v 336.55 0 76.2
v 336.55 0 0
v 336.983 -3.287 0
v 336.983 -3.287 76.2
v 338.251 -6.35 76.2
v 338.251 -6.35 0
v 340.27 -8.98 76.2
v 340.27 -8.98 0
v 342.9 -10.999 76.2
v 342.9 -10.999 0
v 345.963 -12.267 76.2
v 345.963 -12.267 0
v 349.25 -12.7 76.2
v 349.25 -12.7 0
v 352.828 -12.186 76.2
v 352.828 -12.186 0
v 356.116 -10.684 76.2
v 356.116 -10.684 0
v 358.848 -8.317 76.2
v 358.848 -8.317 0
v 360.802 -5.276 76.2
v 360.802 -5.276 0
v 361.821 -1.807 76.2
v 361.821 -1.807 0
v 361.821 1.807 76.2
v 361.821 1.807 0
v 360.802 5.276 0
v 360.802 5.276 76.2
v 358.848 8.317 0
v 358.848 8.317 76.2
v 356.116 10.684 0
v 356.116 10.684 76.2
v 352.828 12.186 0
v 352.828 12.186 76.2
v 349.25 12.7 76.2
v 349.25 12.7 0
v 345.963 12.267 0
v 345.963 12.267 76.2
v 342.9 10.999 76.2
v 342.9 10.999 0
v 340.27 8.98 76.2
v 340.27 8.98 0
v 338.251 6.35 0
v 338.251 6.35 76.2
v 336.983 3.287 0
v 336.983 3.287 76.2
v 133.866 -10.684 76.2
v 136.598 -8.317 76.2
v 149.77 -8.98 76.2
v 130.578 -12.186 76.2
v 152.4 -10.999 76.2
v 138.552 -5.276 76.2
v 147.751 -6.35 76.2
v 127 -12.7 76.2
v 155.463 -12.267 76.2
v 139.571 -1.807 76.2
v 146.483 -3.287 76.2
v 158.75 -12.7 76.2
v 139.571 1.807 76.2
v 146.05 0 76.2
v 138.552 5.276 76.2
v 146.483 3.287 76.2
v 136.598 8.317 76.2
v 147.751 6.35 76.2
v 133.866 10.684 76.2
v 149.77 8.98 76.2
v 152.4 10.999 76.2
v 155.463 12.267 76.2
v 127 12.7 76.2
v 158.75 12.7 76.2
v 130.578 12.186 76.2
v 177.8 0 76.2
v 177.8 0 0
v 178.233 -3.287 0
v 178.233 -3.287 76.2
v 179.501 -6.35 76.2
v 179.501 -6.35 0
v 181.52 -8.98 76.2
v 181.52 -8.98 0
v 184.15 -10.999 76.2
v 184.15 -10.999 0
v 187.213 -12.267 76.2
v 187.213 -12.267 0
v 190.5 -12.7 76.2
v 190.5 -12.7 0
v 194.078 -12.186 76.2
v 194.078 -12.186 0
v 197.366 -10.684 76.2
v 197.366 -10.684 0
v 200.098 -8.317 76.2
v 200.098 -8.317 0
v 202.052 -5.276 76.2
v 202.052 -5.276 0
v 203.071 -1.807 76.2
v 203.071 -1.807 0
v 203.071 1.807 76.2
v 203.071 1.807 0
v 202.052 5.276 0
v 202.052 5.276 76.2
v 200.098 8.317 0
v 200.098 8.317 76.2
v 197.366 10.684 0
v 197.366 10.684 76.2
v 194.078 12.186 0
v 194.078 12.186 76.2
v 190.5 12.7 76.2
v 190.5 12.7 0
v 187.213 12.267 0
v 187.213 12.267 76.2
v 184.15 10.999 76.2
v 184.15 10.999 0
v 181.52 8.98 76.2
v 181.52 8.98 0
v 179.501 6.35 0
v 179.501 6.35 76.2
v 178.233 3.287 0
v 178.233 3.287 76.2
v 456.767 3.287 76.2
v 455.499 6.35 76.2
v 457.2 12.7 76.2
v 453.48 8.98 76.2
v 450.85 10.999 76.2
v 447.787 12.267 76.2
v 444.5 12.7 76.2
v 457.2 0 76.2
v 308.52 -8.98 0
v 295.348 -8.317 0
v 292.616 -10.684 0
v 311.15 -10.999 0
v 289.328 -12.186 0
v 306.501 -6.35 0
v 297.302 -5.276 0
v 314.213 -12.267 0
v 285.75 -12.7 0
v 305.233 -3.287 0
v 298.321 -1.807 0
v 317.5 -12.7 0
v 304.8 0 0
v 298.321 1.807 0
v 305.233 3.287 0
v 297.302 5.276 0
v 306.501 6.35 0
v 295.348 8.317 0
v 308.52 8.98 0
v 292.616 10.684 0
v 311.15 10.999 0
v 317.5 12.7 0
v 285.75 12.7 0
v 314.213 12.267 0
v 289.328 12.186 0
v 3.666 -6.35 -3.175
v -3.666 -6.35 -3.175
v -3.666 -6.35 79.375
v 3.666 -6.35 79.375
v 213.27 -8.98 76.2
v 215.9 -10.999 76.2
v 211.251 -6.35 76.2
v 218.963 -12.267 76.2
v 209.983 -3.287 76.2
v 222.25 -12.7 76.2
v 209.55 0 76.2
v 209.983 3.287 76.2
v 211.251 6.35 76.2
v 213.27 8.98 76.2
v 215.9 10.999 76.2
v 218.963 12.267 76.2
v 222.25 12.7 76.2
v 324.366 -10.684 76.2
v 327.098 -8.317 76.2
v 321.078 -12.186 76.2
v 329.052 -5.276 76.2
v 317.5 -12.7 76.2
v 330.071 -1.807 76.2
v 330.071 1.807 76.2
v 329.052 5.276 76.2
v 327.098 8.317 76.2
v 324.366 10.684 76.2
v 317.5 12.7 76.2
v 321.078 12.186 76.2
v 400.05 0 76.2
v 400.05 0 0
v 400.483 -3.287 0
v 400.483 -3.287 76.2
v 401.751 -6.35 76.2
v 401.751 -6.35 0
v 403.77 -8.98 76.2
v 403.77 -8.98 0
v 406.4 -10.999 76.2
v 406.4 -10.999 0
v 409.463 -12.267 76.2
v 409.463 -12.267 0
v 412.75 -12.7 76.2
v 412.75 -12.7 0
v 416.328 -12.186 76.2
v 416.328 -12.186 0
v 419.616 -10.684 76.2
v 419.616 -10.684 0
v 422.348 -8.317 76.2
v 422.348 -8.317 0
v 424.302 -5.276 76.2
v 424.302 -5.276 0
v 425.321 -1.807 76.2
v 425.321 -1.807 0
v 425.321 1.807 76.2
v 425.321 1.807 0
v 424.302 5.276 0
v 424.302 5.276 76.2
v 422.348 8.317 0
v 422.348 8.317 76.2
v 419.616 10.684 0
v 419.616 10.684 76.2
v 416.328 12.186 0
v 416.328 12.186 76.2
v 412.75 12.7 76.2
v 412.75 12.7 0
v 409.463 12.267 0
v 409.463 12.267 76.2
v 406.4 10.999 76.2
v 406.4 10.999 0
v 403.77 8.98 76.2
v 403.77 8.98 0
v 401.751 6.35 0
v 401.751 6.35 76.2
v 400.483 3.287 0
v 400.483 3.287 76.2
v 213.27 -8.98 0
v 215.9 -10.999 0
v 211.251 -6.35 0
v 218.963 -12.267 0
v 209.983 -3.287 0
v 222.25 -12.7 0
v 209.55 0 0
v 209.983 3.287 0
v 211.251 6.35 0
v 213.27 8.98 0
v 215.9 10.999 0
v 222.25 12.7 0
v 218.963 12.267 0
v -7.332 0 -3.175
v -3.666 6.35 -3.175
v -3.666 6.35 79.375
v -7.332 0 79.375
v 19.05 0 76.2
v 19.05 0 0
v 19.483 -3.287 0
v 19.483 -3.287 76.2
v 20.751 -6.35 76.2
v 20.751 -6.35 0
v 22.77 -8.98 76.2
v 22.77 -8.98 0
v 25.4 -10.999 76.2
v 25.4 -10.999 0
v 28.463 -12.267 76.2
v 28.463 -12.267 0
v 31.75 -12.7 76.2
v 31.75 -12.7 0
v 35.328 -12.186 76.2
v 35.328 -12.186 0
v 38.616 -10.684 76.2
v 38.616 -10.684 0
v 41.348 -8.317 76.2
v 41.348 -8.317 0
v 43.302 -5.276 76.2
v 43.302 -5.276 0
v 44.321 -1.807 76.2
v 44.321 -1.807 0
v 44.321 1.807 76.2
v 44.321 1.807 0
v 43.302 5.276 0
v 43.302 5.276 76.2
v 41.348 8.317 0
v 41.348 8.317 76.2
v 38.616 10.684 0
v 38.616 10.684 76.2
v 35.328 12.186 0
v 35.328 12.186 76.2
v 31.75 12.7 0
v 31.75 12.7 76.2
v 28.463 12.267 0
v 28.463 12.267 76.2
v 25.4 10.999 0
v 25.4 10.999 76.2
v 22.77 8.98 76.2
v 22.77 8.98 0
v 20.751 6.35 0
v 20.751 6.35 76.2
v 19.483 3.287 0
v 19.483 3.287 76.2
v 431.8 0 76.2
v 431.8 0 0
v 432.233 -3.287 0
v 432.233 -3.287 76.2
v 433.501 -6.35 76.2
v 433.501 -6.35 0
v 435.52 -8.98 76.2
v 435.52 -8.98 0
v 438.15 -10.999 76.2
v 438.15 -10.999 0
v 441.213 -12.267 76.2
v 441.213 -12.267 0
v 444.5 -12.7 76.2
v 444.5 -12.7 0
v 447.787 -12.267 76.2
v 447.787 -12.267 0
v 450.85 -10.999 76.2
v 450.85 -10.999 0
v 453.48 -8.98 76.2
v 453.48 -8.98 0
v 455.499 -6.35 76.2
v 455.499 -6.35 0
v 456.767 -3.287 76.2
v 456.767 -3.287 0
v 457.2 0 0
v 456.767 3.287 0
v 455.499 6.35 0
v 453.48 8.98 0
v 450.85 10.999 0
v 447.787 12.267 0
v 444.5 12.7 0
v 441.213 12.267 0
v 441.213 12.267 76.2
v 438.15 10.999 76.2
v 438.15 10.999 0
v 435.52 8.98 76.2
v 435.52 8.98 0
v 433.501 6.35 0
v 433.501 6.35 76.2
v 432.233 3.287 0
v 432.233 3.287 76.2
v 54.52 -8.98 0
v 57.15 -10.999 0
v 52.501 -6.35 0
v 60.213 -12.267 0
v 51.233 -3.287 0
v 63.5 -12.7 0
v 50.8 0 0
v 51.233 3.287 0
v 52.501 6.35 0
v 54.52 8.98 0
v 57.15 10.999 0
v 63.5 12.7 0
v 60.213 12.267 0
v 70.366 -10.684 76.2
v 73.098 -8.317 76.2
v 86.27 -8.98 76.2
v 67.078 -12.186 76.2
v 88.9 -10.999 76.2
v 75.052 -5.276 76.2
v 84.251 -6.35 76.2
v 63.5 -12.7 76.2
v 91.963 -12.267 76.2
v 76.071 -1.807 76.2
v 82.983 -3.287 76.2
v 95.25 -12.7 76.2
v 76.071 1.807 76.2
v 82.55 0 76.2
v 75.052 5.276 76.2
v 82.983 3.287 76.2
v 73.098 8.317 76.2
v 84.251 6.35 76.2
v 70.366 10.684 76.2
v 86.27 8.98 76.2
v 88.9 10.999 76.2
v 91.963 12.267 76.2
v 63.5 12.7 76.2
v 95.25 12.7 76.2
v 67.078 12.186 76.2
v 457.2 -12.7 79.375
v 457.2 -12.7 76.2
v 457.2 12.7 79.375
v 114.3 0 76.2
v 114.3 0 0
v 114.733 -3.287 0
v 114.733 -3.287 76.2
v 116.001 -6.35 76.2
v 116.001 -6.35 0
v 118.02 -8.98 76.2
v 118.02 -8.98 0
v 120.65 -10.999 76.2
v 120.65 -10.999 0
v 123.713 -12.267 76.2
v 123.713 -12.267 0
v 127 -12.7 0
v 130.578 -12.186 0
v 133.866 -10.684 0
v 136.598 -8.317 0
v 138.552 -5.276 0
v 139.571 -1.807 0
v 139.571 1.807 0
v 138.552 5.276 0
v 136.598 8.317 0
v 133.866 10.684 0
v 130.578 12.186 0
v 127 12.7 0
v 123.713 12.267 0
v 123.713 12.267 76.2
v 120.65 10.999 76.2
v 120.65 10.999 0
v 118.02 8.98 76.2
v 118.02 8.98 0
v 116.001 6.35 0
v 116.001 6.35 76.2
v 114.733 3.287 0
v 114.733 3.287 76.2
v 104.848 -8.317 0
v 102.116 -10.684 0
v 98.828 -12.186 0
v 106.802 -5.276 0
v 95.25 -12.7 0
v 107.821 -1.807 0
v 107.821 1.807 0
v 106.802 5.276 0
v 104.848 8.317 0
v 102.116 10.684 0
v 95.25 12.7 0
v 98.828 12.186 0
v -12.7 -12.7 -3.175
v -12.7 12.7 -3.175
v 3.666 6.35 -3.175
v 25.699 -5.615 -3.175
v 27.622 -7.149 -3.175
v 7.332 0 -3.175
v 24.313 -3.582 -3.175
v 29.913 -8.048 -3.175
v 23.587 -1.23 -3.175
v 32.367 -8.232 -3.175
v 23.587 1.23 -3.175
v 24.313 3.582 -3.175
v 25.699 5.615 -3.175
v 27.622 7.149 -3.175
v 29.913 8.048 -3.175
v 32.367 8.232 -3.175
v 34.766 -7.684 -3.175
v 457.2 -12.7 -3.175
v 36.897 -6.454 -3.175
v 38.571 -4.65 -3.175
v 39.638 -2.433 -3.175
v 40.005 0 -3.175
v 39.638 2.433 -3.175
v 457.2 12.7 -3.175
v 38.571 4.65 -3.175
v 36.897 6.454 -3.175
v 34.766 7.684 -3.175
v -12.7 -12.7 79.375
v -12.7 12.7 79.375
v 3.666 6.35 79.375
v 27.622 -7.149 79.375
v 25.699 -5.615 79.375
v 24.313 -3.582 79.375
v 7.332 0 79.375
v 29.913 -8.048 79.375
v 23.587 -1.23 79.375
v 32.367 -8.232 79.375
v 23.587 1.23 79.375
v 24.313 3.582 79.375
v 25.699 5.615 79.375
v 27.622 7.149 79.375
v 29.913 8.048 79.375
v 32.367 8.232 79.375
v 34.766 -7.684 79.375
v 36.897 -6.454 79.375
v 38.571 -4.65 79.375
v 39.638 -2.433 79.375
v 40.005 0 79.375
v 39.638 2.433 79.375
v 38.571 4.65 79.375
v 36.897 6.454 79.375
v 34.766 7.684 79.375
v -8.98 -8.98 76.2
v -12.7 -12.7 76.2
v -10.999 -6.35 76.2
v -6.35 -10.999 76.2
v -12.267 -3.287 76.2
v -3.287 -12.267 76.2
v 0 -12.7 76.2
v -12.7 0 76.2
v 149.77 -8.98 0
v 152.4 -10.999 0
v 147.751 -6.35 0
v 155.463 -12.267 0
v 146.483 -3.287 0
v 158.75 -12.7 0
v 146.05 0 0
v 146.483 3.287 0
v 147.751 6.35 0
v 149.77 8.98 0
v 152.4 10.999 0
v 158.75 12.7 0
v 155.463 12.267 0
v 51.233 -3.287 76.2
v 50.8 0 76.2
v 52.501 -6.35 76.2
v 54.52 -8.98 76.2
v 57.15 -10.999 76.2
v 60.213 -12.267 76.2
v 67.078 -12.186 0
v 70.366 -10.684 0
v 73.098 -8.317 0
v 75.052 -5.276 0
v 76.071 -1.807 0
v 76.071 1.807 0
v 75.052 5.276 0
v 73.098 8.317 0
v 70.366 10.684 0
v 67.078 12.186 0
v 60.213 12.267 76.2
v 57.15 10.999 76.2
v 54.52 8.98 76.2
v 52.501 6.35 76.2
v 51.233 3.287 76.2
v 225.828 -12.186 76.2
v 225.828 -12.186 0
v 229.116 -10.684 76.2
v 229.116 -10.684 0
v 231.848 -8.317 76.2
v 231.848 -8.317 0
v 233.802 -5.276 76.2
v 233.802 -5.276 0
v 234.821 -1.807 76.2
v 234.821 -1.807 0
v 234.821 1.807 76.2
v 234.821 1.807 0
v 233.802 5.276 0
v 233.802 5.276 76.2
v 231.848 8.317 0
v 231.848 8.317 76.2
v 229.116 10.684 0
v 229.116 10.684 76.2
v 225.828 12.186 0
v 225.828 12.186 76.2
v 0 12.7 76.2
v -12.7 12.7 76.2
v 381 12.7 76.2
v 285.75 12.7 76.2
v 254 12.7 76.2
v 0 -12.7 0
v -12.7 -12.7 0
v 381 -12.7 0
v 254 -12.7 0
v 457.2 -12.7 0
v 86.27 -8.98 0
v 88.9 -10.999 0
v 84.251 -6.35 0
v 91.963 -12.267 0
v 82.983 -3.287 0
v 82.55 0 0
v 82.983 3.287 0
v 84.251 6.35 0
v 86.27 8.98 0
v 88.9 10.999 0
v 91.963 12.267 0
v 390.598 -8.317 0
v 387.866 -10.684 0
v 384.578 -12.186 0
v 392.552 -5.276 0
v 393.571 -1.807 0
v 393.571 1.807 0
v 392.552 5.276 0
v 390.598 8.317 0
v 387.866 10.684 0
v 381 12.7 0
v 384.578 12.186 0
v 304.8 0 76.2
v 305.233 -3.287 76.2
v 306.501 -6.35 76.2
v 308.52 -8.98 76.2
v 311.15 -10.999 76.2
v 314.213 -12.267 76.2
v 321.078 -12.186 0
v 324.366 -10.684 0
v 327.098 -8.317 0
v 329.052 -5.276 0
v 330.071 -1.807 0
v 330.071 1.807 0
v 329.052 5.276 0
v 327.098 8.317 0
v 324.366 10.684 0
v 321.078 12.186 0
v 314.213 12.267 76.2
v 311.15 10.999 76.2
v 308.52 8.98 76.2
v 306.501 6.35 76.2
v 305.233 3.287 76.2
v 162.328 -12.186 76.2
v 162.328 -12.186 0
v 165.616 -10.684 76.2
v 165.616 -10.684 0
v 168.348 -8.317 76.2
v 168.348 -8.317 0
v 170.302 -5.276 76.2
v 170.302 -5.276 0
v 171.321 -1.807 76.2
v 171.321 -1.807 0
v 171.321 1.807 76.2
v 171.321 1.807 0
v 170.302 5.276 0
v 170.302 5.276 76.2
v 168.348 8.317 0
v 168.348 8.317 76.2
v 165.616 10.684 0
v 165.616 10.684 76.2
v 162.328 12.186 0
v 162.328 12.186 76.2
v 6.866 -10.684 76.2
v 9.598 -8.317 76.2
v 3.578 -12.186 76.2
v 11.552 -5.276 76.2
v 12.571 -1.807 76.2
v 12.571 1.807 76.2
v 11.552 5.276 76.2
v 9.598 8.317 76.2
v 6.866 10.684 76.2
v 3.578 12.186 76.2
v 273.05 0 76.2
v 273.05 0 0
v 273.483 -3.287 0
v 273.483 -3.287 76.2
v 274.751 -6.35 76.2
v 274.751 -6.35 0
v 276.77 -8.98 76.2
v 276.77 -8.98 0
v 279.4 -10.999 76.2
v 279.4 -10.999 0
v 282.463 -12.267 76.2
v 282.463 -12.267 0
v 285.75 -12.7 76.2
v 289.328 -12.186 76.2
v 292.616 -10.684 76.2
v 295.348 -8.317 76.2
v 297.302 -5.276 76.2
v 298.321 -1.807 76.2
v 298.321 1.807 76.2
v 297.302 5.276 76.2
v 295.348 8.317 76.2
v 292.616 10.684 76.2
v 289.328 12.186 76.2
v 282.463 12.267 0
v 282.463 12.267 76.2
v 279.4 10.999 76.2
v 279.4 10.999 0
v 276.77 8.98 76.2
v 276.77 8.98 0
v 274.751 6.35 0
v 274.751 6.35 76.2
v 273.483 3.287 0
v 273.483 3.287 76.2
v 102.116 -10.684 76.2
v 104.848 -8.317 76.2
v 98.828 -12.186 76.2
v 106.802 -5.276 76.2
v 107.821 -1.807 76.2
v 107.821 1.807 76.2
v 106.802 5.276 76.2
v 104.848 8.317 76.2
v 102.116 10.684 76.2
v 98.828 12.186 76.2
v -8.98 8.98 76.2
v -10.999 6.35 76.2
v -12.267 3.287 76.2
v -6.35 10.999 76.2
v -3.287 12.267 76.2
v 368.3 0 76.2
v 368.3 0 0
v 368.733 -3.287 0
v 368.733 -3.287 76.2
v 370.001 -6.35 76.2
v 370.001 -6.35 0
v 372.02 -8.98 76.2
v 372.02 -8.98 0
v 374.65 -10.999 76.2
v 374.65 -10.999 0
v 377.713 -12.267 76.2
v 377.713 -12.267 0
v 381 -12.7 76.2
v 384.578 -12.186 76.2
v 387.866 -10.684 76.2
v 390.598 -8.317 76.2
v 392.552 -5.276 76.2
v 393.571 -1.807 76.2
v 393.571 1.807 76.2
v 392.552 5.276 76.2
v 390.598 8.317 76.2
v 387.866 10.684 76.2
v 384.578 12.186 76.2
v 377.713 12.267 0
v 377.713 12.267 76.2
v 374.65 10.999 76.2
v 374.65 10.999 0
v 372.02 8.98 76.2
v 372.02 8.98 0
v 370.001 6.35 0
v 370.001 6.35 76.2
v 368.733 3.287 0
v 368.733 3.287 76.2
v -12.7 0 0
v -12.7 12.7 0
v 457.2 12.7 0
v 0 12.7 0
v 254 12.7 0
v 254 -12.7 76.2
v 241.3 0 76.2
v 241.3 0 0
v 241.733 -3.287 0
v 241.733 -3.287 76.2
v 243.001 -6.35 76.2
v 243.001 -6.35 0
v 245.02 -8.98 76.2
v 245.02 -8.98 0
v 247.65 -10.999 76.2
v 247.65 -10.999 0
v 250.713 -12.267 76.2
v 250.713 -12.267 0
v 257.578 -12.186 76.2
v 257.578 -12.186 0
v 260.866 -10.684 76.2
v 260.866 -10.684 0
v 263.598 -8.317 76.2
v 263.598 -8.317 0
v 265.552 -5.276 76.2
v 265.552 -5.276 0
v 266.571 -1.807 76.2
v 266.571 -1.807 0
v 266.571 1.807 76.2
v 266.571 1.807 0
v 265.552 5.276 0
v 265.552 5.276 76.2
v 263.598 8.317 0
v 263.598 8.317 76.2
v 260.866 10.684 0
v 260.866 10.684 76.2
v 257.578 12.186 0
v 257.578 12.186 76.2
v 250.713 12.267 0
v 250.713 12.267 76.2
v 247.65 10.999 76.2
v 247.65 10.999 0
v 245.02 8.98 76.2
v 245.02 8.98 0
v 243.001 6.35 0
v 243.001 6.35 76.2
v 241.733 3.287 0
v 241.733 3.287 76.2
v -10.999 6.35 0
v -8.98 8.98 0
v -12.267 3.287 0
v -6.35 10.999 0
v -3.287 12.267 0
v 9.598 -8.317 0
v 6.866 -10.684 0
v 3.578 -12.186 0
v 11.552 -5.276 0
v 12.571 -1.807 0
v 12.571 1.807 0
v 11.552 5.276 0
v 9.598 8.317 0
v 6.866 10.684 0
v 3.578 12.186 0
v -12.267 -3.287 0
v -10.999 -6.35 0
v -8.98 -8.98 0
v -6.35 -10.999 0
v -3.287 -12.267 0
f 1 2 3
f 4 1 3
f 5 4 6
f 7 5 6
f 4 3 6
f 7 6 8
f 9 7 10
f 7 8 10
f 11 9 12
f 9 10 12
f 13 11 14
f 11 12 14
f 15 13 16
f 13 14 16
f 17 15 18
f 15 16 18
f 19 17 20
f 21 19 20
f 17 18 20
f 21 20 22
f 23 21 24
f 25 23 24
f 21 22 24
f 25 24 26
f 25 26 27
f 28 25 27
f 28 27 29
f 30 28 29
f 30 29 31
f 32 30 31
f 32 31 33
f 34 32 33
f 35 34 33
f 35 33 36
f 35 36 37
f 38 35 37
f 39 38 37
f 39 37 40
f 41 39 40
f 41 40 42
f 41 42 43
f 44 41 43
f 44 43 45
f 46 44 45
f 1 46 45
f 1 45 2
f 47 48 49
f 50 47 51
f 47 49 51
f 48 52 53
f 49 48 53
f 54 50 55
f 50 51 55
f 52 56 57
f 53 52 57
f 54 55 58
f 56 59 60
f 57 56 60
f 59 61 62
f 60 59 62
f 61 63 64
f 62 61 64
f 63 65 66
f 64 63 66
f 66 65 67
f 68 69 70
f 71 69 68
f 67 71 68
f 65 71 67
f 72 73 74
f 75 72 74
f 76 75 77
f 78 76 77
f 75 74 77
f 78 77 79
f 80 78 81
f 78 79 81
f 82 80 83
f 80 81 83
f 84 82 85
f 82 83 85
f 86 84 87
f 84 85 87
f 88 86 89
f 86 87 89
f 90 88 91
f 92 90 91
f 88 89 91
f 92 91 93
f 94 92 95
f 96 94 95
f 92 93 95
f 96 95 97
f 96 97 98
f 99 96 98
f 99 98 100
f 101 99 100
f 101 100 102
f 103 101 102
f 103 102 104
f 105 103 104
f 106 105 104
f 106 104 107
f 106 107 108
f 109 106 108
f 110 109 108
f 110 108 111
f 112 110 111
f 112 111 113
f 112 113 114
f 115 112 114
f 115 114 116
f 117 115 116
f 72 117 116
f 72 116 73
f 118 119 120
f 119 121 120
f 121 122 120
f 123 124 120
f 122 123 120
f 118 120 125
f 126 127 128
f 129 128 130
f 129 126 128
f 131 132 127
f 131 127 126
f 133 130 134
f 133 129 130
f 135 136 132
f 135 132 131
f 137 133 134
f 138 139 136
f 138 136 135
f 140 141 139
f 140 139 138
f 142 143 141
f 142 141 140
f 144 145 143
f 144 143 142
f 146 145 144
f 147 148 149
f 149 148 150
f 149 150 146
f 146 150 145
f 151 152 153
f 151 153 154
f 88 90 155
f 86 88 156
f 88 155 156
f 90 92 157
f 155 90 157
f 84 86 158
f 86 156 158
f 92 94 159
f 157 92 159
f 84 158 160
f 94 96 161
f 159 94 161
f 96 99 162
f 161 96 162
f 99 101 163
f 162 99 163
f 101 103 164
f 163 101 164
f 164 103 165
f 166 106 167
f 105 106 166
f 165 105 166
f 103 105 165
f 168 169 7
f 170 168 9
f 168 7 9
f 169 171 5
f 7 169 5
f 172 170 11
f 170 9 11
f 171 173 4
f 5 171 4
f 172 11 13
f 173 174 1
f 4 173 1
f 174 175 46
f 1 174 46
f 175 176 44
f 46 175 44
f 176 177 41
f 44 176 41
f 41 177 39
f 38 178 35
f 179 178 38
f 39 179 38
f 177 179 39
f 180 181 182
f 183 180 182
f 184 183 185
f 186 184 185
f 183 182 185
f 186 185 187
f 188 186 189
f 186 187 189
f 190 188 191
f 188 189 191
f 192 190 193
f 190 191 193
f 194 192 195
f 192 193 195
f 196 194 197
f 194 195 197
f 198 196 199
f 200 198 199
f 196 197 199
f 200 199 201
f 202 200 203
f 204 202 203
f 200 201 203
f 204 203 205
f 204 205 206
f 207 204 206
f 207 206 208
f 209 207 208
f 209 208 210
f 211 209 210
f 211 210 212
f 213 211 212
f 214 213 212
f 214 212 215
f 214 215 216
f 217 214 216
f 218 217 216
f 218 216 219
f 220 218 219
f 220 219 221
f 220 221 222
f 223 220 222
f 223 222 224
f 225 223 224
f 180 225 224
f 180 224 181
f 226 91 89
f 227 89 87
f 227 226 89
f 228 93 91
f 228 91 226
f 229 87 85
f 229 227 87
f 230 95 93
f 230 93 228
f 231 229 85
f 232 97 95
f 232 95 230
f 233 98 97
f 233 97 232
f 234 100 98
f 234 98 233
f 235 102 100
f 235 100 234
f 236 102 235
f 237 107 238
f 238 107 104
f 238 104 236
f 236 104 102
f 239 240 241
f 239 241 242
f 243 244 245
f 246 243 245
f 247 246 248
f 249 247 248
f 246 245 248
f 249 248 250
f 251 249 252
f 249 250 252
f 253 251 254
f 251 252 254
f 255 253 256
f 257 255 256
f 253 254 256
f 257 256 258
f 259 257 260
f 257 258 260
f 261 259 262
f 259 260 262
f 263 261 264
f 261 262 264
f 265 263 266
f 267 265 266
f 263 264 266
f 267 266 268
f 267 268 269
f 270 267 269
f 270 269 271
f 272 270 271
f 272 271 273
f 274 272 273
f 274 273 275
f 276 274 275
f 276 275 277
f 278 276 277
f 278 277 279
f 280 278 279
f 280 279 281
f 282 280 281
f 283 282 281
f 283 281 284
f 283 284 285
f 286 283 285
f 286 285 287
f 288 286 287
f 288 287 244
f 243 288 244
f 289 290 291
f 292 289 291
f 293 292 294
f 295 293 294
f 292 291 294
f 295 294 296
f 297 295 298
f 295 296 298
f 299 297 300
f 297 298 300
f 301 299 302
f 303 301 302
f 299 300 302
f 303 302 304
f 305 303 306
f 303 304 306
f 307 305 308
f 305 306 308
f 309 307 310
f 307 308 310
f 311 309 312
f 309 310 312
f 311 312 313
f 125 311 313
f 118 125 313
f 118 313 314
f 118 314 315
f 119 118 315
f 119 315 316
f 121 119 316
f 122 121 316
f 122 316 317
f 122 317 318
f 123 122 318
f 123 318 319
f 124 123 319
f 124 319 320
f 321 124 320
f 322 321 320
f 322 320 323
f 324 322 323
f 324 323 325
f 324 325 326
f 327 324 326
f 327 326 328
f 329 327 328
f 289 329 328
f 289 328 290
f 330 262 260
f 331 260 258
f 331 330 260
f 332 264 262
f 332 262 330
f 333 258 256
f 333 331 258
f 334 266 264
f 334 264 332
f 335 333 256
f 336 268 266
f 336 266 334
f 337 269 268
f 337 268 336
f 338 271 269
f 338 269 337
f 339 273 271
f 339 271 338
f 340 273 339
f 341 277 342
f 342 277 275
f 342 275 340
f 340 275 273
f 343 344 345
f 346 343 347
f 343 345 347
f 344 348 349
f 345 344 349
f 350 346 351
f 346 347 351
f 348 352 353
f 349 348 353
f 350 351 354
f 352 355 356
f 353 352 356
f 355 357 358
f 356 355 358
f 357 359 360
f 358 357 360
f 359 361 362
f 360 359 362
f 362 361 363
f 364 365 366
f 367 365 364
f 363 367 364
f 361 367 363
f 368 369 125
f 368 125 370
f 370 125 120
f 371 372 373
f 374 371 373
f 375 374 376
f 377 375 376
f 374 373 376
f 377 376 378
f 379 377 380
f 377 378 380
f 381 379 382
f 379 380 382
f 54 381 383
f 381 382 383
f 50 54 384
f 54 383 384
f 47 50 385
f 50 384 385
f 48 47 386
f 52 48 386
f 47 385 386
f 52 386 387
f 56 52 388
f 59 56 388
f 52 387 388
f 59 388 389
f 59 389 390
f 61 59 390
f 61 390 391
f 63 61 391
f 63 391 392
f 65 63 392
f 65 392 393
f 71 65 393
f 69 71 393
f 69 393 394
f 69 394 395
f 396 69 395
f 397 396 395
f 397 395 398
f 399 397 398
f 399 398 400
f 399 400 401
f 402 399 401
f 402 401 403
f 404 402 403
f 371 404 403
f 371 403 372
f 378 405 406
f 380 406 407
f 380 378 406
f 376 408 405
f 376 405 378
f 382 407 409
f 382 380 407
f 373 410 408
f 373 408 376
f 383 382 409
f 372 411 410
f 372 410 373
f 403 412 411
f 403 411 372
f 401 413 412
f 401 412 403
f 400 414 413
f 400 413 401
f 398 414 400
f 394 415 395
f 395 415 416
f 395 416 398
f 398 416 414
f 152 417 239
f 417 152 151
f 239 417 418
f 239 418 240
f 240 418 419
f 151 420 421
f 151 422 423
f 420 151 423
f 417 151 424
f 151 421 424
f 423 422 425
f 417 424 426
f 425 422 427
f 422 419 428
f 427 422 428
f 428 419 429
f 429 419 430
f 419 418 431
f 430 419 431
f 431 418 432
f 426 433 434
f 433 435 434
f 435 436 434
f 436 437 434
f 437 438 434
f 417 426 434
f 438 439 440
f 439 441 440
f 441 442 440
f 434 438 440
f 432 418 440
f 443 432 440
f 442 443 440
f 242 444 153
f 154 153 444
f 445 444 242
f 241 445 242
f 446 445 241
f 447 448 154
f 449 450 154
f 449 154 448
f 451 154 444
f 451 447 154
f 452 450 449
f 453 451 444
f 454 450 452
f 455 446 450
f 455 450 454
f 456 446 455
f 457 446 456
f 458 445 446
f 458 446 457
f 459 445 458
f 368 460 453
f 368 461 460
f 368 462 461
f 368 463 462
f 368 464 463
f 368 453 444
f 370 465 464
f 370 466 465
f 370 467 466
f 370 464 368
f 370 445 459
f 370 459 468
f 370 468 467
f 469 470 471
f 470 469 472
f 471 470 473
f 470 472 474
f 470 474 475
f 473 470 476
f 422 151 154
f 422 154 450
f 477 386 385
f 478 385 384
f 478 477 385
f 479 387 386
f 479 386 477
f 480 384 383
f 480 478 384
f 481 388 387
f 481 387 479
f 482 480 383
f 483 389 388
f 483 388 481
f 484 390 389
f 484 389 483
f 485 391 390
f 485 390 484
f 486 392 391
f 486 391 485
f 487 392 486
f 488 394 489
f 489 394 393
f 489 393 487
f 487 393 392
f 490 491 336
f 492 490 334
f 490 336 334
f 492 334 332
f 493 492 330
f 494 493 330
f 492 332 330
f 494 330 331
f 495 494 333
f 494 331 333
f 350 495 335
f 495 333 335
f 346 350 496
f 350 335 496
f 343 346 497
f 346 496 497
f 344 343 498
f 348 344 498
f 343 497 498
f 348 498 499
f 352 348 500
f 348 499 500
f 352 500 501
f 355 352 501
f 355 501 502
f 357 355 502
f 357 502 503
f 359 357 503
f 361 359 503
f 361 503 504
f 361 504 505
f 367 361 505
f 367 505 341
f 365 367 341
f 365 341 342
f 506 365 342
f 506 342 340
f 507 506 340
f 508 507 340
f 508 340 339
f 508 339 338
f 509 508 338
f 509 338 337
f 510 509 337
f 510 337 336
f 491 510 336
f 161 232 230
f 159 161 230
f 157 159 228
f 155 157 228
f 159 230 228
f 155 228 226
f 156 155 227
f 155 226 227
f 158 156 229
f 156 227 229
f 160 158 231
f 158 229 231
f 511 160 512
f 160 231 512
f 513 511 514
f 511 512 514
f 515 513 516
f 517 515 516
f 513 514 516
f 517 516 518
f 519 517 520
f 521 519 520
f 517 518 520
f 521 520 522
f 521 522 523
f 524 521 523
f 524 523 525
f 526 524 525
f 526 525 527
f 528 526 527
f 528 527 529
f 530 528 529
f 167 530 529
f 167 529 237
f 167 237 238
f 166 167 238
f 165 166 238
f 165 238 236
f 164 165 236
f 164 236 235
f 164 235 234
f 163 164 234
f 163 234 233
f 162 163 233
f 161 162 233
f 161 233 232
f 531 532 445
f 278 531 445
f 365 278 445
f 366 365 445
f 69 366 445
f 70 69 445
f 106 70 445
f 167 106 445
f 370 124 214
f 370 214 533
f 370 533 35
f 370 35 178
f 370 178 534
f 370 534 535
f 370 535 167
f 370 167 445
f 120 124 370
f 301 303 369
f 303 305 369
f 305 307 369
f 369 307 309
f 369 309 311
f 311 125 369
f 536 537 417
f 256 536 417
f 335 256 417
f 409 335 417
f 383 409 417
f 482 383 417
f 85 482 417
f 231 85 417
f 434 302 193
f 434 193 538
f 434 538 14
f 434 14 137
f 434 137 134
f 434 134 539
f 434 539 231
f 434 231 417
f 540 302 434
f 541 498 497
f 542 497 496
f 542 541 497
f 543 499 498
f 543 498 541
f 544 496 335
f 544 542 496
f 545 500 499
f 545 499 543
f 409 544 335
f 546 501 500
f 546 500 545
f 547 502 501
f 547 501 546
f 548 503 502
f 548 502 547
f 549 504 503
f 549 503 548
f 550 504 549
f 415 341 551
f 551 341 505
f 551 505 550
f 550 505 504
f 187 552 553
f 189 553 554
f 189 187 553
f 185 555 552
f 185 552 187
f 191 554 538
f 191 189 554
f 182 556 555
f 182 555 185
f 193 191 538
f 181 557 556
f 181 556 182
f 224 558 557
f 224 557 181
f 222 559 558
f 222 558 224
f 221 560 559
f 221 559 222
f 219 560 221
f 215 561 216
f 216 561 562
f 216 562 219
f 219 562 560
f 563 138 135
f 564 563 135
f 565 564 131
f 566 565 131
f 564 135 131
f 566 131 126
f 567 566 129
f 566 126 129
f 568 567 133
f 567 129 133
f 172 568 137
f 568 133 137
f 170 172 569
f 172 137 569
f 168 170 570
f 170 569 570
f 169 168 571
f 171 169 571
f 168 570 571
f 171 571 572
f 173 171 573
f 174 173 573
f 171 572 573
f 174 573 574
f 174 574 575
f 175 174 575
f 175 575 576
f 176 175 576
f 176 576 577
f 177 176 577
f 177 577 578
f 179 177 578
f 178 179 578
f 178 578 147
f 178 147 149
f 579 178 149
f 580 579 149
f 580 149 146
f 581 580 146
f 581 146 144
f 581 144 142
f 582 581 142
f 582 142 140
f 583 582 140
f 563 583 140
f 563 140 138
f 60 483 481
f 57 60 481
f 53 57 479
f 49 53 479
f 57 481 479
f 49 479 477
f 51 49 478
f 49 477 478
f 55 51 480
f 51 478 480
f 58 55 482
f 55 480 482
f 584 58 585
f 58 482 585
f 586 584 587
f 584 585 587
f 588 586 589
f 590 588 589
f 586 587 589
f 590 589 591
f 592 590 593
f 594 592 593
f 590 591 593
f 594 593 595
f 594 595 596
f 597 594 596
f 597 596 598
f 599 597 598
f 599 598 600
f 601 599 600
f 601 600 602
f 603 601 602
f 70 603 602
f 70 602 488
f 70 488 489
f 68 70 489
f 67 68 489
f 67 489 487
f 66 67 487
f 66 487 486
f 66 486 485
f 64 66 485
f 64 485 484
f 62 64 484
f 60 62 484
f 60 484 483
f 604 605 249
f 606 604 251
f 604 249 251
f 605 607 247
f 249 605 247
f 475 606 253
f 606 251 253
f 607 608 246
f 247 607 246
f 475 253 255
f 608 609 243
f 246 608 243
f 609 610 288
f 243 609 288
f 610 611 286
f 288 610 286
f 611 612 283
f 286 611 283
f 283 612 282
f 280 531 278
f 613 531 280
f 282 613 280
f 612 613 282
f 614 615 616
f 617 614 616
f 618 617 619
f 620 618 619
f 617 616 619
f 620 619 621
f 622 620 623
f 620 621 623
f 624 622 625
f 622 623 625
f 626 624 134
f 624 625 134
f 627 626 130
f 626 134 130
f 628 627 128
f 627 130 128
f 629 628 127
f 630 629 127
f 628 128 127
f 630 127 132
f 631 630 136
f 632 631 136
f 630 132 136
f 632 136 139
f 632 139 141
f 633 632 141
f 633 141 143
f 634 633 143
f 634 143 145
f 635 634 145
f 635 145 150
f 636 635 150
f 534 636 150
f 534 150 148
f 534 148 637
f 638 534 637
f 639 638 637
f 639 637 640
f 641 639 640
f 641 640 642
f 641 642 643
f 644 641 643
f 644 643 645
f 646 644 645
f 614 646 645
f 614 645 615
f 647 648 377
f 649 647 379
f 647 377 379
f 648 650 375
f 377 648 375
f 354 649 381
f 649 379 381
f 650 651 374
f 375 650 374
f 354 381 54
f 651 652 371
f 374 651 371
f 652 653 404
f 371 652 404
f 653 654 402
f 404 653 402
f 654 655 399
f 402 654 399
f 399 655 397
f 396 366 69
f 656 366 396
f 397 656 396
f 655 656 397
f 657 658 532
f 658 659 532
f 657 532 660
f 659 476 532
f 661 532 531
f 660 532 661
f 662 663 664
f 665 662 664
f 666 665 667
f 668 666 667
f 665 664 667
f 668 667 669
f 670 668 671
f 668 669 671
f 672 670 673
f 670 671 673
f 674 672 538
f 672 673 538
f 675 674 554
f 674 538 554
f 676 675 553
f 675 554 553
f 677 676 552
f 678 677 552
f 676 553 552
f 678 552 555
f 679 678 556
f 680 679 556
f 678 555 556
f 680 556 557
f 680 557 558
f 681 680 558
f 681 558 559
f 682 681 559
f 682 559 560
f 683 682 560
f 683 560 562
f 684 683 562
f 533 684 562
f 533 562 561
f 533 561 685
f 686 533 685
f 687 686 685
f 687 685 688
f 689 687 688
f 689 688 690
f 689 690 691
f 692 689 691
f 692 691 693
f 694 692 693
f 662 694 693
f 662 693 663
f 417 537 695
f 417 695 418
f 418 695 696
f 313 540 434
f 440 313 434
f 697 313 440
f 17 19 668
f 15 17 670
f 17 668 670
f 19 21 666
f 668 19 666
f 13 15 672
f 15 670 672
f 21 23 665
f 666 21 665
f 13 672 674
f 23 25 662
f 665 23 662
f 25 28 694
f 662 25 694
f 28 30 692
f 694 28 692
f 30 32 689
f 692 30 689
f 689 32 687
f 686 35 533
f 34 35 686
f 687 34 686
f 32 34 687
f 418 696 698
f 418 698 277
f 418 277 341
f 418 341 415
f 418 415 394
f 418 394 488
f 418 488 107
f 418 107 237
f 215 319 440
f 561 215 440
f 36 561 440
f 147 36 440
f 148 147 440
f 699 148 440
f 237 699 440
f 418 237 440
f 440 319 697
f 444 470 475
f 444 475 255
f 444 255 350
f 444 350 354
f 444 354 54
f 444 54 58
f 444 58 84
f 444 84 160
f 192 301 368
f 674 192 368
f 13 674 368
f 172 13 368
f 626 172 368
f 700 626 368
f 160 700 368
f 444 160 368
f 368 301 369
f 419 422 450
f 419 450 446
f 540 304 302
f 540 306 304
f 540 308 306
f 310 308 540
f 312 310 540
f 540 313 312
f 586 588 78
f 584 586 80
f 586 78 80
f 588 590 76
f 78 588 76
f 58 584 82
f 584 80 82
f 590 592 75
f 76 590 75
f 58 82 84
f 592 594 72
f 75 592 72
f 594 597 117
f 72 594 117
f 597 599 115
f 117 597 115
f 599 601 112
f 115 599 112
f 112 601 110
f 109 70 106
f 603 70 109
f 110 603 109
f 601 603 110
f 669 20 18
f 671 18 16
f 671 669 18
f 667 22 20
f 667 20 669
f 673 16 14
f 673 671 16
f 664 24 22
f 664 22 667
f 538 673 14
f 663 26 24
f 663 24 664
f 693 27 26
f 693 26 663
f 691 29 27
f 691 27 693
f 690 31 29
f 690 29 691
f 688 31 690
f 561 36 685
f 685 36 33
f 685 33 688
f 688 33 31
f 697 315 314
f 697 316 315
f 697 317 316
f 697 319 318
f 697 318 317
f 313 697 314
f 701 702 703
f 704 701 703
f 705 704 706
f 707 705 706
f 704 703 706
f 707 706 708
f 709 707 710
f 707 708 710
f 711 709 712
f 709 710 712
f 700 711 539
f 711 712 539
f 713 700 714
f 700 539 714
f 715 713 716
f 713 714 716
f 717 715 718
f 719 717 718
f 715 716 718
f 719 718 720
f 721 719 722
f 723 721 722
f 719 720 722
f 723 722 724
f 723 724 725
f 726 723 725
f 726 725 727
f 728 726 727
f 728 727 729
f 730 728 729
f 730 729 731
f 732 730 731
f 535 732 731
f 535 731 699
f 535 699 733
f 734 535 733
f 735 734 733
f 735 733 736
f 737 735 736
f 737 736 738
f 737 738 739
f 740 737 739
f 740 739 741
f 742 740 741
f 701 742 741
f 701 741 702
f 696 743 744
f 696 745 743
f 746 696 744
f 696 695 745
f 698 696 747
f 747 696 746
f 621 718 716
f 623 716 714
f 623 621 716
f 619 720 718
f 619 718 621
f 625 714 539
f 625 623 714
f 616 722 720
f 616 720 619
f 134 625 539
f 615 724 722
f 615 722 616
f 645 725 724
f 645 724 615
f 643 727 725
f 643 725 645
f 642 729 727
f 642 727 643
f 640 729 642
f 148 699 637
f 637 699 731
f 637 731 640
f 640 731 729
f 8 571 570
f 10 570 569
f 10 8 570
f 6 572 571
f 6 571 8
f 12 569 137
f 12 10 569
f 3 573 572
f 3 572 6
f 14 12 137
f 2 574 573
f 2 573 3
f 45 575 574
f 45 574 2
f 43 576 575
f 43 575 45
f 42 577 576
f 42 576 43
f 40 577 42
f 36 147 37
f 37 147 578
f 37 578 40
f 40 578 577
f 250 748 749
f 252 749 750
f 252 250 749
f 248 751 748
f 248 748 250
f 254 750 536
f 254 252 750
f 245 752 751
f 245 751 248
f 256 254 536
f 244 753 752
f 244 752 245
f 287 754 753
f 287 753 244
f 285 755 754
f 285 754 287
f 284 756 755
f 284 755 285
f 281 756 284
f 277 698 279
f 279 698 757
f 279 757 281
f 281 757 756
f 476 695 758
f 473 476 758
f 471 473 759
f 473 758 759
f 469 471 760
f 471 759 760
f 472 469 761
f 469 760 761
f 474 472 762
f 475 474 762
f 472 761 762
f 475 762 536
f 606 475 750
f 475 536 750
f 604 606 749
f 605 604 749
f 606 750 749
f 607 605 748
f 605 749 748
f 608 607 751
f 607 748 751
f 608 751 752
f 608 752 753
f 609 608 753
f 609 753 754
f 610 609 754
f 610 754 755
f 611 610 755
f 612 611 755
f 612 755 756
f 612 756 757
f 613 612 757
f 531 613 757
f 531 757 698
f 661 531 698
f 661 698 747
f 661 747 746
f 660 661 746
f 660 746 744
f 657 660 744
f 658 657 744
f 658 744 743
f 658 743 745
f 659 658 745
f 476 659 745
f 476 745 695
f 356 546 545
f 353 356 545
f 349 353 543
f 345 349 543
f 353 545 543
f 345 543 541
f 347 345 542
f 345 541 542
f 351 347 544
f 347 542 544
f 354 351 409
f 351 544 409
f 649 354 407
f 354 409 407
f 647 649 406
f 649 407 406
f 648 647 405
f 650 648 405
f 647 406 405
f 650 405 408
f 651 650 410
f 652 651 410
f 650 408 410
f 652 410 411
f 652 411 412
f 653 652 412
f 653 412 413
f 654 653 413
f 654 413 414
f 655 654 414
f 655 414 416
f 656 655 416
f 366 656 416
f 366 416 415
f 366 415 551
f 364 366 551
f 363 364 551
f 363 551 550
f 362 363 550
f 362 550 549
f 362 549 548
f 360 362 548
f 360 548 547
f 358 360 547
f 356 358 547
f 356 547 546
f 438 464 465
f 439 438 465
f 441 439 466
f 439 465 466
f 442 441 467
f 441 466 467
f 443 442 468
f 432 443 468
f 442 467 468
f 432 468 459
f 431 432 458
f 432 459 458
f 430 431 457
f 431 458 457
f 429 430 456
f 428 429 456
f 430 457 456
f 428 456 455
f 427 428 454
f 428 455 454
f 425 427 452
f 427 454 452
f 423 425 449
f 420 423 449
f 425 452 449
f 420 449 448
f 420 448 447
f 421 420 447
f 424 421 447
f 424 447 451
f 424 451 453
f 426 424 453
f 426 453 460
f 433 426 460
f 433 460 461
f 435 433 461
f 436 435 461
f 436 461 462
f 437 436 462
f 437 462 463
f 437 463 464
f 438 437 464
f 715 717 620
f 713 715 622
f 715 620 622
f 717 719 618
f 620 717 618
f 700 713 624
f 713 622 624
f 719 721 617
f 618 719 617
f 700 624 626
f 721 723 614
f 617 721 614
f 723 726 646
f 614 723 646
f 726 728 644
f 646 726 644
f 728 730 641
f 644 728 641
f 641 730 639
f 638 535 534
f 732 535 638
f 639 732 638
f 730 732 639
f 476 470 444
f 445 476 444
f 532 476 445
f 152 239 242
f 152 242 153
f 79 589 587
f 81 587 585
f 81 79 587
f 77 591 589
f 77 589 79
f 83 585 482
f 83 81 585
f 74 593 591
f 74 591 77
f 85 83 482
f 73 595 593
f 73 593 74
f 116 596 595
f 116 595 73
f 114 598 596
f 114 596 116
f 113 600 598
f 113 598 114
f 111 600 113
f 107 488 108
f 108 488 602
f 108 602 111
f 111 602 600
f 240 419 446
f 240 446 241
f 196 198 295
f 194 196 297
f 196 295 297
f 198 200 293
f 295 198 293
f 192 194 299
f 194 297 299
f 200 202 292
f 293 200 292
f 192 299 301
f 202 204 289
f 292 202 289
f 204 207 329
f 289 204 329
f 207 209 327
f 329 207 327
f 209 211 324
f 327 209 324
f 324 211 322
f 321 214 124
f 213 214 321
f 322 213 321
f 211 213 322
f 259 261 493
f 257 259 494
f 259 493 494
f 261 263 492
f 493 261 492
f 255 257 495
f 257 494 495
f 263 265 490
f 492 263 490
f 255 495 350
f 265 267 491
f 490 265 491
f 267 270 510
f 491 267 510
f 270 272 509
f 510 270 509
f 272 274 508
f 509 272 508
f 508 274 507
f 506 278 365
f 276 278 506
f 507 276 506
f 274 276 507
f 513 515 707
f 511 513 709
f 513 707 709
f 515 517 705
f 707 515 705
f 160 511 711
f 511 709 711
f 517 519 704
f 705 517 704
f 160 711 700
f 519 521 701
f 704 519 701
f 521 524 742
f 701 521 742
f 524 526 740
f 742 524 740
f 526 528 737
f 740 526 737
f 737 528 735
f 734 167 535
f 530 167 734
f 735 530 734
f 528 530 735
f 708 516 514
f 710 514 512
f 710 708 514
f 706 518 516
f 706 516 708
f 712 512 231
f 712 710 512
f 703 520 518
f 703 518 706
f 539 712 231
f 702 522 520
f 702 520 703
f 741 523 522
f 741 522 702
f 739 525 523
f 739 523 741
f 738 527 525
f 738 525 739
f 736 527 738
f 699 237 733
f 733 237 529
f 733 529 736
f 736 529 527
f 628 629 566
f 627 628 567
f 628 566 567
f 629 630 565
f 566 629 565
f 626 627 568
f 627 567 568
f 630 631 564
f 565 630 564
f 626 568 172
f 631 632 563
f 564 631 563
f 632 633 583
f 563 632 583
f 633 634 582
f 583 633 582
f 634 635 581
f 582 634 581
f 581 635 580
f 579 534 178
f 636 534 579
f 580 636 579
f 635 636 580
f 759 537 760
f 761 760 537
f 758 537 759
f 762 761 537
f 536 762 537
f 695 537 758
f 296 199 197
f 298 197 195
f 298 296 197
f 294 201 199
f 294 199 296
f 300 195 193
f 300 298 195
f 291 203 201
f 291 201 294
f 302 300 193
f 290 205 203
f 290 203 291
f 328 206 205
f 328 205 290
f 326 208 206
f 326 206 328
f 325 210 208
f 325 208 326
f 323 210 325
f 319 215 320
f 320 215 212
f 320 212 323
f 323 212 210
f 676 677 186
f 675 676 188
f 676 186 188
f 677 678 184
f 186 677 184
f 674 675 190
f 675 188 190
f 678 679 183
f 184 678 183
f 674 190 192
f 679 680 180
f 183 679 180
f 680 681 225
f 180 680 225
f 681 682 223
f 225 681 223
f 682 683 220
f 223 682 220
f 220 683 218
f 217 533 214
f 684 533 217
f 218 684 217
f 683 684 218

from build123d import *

# Parameters (mm, degrees)
SKETCH1_R           = 12.7
BOSS_EXTRUDE1_DEPTH = 76.2
LPATTERN1_COUNT     = 15
LPATTERN1_PITCH     = 31.75
SKETCH2_W           = 469.9
SKETCH2_H           = 25.4
BOSS_EXTRUDE2_DEPTH = 3.175
SKETCH3_R           = 8.255
CUT_EXTRUDE1_DEPTH  = 465.766212735


with BuildPart() as part:
    # Sketch1 → Boss-Extrude1 (new body)
    with BuildSketch(Plane.XY):
        with Locations(Location((0, 0, 0), (0, 0, 180))):
            Circle(SKETCH1_R)
    extrude(amount=BOSS_EXTRUDE1_DEPTH)


with BuildPart() as lpattern1_1:
    # LPattern1: pattern copy
    add(part.part.moved(Location(Vector(1, 0, 0) * (1 * LPATTERN1_PITCH))))


with BuildPart() as lpattern1_2:
    # LPattern1: pattern copy
    add(part.part.moved(Location(Vector(1, 0, 0) * (2 * LPATTERN1_PITCH))))


with BuildPart() as lpattern1_3:
    # LPattern1: pattern copy
    add(part.part.moved(Location(Vector(1, 0, 0) * (3 * LPATTERN1_PITCH))))


with BuildPart() as lpattern1_4:
    # LPattern1: pattern copy
    add(part.part.moved(Location(Vector(1, 0, 0) * (4 * LPATTERN1_PITCH))))


with BuildPart() as lpattern1_5:
    # LPattern1: pattern copy
    add(part.part.moved(Location(Vector(1, 0, 0) * (5 * LPATTERN1_PITCH))))


with BuildPart() as lpattern1_6:
    # LPattern1: pattern copy
    add(part.part.moved(Location(Vector(1, 0, 0) * (6 * LPATTERN1_PITCH))))


with BuildPart() as lpattern1_7:
    # LPattern1: pattern copy
    add(part.part.moved(Location(Vector(1, 0, 0) * (7 * LPATTERN1_PITCH))))


with BuildPart() as lpattern1_8:
    # LPattern1: pattern copy
    add(part.part.moved(Location(Vector(1, 0, 0) * (8 * LPATTERN1_PITCH))))


with BuildPart() as lpattern1_9:
    # LPattern1: pattern copy
    add(part.part.moved(Location(Vector(1, 0, 0) * (9 * LPATTERN1_PITCH))))


with BuildPart() as lpattern1_10:
    # LPattern1: pattern copy
    add(part.part.moved(Location(Vector(1, 0, 0) * (10 * LPATTERN1_PITCH))))


with BuildPart() as lpattern1_11:
    # LPattern1: pattern copy
    add(part.part.moved(Location(Vector(1, 0, 0) * (11 * LPATTERN1_PITCH))))


with BuildPart() as lpattern1_12:
    # LPattern1: pattern copy
    add(part.part.moved(Location(Vector(1, 0, 0) * (12 * LPATTERN1_PITCH))))


with BuildPart() as lpattern1_13:
    # LPattern1: pattern copy
    add(part.part.moved(Location(Vector(1, 0, 0) * (13 * LPATTERN1_PITCH))))


with BuildPart() as lpattern1_14:
    # LPattern1: pattern copy
    add(part.part.moved(Location(Vector(1, 0, 0) * (14 * LPATTERN1_PITCH))))


with BuildPart() as part_1:
    add(part.part)

    add(lpattern1_1.part)  # Boss-Extrude2 merges LPattern1_1

    add(lpattern1_2.part)  # Boss-Extrude2 merges LPattern1_2

    add(lpattern1_3.part)  # Boss-Extrude2 merges LPattern1_3

    add(lpattern1_4.part)  # Boss-Extrude2 merges LPattern1_4

    add(lpattern1_5.part)  # Boss-Extrude2 merges LPattern1_5

    add(lpattern1_6.part)  # Boss-Extrude2 merges LPattern1_6

    add(lpattern1_7.part)  # Boss-Extrude2 merges LPattern1_7

    add(lpattern1_8.part)  # Boss-Extrude2 merges LPattern1_8

    add(lpattern1_9.part)  # Boss-Extrude2 merges LPattern1_9

    add(lpattern1_10.part)  # Boss-Extrude2 merges LPattern1_10

    add(lpattern1_11.part)  # Boss-Extrude2 merges LPattern1_11

    add(lpattern1_12.part)  # Boss-Extrude2 merges LPattern1_12

    add(lpattern1_13.part)  # Boss-Extrude2 merges LPattern1_13

    add(lpattern1_14.part)  # Boss-Extrude2 merges LPattern1_14
    # Sketch2 → Boss-Extrude2 (add)
    with BuildSketch(Plane.XY.offset(76.2)):
        with Locations((222.25, 0)):
            Rectangle(SKETCH2_W, SKETCH2_H)
    boss_extrude2 = extrude(amount=BOSS_EXTRUDE2_DEPTH)

    # Mirror1: Boss-Extrude2 across plane
    add(boss_extrude2.mirror(Plane.XY.offset(38.1)))

    # Sketch3 → Cut-Extrude1 (cut, through all)
    with BuildSketch(Plane.XY.offset(79.375)):
        with Locations((31.75, 0)):
            Circle(SKETCH3_R)
        Polygon((7.332348419, 0), (3.666174209, 6.35), (-3.666174209, 6.35), (-7.332348419, 0), (-3.666174209, -6.35), (3.666174209, -6.35), align=None)
    extrude(amount=-CUT_EXTRUDE1_DEPTH, mode=Mode.SUBTRACT)


solid = part_1.part
